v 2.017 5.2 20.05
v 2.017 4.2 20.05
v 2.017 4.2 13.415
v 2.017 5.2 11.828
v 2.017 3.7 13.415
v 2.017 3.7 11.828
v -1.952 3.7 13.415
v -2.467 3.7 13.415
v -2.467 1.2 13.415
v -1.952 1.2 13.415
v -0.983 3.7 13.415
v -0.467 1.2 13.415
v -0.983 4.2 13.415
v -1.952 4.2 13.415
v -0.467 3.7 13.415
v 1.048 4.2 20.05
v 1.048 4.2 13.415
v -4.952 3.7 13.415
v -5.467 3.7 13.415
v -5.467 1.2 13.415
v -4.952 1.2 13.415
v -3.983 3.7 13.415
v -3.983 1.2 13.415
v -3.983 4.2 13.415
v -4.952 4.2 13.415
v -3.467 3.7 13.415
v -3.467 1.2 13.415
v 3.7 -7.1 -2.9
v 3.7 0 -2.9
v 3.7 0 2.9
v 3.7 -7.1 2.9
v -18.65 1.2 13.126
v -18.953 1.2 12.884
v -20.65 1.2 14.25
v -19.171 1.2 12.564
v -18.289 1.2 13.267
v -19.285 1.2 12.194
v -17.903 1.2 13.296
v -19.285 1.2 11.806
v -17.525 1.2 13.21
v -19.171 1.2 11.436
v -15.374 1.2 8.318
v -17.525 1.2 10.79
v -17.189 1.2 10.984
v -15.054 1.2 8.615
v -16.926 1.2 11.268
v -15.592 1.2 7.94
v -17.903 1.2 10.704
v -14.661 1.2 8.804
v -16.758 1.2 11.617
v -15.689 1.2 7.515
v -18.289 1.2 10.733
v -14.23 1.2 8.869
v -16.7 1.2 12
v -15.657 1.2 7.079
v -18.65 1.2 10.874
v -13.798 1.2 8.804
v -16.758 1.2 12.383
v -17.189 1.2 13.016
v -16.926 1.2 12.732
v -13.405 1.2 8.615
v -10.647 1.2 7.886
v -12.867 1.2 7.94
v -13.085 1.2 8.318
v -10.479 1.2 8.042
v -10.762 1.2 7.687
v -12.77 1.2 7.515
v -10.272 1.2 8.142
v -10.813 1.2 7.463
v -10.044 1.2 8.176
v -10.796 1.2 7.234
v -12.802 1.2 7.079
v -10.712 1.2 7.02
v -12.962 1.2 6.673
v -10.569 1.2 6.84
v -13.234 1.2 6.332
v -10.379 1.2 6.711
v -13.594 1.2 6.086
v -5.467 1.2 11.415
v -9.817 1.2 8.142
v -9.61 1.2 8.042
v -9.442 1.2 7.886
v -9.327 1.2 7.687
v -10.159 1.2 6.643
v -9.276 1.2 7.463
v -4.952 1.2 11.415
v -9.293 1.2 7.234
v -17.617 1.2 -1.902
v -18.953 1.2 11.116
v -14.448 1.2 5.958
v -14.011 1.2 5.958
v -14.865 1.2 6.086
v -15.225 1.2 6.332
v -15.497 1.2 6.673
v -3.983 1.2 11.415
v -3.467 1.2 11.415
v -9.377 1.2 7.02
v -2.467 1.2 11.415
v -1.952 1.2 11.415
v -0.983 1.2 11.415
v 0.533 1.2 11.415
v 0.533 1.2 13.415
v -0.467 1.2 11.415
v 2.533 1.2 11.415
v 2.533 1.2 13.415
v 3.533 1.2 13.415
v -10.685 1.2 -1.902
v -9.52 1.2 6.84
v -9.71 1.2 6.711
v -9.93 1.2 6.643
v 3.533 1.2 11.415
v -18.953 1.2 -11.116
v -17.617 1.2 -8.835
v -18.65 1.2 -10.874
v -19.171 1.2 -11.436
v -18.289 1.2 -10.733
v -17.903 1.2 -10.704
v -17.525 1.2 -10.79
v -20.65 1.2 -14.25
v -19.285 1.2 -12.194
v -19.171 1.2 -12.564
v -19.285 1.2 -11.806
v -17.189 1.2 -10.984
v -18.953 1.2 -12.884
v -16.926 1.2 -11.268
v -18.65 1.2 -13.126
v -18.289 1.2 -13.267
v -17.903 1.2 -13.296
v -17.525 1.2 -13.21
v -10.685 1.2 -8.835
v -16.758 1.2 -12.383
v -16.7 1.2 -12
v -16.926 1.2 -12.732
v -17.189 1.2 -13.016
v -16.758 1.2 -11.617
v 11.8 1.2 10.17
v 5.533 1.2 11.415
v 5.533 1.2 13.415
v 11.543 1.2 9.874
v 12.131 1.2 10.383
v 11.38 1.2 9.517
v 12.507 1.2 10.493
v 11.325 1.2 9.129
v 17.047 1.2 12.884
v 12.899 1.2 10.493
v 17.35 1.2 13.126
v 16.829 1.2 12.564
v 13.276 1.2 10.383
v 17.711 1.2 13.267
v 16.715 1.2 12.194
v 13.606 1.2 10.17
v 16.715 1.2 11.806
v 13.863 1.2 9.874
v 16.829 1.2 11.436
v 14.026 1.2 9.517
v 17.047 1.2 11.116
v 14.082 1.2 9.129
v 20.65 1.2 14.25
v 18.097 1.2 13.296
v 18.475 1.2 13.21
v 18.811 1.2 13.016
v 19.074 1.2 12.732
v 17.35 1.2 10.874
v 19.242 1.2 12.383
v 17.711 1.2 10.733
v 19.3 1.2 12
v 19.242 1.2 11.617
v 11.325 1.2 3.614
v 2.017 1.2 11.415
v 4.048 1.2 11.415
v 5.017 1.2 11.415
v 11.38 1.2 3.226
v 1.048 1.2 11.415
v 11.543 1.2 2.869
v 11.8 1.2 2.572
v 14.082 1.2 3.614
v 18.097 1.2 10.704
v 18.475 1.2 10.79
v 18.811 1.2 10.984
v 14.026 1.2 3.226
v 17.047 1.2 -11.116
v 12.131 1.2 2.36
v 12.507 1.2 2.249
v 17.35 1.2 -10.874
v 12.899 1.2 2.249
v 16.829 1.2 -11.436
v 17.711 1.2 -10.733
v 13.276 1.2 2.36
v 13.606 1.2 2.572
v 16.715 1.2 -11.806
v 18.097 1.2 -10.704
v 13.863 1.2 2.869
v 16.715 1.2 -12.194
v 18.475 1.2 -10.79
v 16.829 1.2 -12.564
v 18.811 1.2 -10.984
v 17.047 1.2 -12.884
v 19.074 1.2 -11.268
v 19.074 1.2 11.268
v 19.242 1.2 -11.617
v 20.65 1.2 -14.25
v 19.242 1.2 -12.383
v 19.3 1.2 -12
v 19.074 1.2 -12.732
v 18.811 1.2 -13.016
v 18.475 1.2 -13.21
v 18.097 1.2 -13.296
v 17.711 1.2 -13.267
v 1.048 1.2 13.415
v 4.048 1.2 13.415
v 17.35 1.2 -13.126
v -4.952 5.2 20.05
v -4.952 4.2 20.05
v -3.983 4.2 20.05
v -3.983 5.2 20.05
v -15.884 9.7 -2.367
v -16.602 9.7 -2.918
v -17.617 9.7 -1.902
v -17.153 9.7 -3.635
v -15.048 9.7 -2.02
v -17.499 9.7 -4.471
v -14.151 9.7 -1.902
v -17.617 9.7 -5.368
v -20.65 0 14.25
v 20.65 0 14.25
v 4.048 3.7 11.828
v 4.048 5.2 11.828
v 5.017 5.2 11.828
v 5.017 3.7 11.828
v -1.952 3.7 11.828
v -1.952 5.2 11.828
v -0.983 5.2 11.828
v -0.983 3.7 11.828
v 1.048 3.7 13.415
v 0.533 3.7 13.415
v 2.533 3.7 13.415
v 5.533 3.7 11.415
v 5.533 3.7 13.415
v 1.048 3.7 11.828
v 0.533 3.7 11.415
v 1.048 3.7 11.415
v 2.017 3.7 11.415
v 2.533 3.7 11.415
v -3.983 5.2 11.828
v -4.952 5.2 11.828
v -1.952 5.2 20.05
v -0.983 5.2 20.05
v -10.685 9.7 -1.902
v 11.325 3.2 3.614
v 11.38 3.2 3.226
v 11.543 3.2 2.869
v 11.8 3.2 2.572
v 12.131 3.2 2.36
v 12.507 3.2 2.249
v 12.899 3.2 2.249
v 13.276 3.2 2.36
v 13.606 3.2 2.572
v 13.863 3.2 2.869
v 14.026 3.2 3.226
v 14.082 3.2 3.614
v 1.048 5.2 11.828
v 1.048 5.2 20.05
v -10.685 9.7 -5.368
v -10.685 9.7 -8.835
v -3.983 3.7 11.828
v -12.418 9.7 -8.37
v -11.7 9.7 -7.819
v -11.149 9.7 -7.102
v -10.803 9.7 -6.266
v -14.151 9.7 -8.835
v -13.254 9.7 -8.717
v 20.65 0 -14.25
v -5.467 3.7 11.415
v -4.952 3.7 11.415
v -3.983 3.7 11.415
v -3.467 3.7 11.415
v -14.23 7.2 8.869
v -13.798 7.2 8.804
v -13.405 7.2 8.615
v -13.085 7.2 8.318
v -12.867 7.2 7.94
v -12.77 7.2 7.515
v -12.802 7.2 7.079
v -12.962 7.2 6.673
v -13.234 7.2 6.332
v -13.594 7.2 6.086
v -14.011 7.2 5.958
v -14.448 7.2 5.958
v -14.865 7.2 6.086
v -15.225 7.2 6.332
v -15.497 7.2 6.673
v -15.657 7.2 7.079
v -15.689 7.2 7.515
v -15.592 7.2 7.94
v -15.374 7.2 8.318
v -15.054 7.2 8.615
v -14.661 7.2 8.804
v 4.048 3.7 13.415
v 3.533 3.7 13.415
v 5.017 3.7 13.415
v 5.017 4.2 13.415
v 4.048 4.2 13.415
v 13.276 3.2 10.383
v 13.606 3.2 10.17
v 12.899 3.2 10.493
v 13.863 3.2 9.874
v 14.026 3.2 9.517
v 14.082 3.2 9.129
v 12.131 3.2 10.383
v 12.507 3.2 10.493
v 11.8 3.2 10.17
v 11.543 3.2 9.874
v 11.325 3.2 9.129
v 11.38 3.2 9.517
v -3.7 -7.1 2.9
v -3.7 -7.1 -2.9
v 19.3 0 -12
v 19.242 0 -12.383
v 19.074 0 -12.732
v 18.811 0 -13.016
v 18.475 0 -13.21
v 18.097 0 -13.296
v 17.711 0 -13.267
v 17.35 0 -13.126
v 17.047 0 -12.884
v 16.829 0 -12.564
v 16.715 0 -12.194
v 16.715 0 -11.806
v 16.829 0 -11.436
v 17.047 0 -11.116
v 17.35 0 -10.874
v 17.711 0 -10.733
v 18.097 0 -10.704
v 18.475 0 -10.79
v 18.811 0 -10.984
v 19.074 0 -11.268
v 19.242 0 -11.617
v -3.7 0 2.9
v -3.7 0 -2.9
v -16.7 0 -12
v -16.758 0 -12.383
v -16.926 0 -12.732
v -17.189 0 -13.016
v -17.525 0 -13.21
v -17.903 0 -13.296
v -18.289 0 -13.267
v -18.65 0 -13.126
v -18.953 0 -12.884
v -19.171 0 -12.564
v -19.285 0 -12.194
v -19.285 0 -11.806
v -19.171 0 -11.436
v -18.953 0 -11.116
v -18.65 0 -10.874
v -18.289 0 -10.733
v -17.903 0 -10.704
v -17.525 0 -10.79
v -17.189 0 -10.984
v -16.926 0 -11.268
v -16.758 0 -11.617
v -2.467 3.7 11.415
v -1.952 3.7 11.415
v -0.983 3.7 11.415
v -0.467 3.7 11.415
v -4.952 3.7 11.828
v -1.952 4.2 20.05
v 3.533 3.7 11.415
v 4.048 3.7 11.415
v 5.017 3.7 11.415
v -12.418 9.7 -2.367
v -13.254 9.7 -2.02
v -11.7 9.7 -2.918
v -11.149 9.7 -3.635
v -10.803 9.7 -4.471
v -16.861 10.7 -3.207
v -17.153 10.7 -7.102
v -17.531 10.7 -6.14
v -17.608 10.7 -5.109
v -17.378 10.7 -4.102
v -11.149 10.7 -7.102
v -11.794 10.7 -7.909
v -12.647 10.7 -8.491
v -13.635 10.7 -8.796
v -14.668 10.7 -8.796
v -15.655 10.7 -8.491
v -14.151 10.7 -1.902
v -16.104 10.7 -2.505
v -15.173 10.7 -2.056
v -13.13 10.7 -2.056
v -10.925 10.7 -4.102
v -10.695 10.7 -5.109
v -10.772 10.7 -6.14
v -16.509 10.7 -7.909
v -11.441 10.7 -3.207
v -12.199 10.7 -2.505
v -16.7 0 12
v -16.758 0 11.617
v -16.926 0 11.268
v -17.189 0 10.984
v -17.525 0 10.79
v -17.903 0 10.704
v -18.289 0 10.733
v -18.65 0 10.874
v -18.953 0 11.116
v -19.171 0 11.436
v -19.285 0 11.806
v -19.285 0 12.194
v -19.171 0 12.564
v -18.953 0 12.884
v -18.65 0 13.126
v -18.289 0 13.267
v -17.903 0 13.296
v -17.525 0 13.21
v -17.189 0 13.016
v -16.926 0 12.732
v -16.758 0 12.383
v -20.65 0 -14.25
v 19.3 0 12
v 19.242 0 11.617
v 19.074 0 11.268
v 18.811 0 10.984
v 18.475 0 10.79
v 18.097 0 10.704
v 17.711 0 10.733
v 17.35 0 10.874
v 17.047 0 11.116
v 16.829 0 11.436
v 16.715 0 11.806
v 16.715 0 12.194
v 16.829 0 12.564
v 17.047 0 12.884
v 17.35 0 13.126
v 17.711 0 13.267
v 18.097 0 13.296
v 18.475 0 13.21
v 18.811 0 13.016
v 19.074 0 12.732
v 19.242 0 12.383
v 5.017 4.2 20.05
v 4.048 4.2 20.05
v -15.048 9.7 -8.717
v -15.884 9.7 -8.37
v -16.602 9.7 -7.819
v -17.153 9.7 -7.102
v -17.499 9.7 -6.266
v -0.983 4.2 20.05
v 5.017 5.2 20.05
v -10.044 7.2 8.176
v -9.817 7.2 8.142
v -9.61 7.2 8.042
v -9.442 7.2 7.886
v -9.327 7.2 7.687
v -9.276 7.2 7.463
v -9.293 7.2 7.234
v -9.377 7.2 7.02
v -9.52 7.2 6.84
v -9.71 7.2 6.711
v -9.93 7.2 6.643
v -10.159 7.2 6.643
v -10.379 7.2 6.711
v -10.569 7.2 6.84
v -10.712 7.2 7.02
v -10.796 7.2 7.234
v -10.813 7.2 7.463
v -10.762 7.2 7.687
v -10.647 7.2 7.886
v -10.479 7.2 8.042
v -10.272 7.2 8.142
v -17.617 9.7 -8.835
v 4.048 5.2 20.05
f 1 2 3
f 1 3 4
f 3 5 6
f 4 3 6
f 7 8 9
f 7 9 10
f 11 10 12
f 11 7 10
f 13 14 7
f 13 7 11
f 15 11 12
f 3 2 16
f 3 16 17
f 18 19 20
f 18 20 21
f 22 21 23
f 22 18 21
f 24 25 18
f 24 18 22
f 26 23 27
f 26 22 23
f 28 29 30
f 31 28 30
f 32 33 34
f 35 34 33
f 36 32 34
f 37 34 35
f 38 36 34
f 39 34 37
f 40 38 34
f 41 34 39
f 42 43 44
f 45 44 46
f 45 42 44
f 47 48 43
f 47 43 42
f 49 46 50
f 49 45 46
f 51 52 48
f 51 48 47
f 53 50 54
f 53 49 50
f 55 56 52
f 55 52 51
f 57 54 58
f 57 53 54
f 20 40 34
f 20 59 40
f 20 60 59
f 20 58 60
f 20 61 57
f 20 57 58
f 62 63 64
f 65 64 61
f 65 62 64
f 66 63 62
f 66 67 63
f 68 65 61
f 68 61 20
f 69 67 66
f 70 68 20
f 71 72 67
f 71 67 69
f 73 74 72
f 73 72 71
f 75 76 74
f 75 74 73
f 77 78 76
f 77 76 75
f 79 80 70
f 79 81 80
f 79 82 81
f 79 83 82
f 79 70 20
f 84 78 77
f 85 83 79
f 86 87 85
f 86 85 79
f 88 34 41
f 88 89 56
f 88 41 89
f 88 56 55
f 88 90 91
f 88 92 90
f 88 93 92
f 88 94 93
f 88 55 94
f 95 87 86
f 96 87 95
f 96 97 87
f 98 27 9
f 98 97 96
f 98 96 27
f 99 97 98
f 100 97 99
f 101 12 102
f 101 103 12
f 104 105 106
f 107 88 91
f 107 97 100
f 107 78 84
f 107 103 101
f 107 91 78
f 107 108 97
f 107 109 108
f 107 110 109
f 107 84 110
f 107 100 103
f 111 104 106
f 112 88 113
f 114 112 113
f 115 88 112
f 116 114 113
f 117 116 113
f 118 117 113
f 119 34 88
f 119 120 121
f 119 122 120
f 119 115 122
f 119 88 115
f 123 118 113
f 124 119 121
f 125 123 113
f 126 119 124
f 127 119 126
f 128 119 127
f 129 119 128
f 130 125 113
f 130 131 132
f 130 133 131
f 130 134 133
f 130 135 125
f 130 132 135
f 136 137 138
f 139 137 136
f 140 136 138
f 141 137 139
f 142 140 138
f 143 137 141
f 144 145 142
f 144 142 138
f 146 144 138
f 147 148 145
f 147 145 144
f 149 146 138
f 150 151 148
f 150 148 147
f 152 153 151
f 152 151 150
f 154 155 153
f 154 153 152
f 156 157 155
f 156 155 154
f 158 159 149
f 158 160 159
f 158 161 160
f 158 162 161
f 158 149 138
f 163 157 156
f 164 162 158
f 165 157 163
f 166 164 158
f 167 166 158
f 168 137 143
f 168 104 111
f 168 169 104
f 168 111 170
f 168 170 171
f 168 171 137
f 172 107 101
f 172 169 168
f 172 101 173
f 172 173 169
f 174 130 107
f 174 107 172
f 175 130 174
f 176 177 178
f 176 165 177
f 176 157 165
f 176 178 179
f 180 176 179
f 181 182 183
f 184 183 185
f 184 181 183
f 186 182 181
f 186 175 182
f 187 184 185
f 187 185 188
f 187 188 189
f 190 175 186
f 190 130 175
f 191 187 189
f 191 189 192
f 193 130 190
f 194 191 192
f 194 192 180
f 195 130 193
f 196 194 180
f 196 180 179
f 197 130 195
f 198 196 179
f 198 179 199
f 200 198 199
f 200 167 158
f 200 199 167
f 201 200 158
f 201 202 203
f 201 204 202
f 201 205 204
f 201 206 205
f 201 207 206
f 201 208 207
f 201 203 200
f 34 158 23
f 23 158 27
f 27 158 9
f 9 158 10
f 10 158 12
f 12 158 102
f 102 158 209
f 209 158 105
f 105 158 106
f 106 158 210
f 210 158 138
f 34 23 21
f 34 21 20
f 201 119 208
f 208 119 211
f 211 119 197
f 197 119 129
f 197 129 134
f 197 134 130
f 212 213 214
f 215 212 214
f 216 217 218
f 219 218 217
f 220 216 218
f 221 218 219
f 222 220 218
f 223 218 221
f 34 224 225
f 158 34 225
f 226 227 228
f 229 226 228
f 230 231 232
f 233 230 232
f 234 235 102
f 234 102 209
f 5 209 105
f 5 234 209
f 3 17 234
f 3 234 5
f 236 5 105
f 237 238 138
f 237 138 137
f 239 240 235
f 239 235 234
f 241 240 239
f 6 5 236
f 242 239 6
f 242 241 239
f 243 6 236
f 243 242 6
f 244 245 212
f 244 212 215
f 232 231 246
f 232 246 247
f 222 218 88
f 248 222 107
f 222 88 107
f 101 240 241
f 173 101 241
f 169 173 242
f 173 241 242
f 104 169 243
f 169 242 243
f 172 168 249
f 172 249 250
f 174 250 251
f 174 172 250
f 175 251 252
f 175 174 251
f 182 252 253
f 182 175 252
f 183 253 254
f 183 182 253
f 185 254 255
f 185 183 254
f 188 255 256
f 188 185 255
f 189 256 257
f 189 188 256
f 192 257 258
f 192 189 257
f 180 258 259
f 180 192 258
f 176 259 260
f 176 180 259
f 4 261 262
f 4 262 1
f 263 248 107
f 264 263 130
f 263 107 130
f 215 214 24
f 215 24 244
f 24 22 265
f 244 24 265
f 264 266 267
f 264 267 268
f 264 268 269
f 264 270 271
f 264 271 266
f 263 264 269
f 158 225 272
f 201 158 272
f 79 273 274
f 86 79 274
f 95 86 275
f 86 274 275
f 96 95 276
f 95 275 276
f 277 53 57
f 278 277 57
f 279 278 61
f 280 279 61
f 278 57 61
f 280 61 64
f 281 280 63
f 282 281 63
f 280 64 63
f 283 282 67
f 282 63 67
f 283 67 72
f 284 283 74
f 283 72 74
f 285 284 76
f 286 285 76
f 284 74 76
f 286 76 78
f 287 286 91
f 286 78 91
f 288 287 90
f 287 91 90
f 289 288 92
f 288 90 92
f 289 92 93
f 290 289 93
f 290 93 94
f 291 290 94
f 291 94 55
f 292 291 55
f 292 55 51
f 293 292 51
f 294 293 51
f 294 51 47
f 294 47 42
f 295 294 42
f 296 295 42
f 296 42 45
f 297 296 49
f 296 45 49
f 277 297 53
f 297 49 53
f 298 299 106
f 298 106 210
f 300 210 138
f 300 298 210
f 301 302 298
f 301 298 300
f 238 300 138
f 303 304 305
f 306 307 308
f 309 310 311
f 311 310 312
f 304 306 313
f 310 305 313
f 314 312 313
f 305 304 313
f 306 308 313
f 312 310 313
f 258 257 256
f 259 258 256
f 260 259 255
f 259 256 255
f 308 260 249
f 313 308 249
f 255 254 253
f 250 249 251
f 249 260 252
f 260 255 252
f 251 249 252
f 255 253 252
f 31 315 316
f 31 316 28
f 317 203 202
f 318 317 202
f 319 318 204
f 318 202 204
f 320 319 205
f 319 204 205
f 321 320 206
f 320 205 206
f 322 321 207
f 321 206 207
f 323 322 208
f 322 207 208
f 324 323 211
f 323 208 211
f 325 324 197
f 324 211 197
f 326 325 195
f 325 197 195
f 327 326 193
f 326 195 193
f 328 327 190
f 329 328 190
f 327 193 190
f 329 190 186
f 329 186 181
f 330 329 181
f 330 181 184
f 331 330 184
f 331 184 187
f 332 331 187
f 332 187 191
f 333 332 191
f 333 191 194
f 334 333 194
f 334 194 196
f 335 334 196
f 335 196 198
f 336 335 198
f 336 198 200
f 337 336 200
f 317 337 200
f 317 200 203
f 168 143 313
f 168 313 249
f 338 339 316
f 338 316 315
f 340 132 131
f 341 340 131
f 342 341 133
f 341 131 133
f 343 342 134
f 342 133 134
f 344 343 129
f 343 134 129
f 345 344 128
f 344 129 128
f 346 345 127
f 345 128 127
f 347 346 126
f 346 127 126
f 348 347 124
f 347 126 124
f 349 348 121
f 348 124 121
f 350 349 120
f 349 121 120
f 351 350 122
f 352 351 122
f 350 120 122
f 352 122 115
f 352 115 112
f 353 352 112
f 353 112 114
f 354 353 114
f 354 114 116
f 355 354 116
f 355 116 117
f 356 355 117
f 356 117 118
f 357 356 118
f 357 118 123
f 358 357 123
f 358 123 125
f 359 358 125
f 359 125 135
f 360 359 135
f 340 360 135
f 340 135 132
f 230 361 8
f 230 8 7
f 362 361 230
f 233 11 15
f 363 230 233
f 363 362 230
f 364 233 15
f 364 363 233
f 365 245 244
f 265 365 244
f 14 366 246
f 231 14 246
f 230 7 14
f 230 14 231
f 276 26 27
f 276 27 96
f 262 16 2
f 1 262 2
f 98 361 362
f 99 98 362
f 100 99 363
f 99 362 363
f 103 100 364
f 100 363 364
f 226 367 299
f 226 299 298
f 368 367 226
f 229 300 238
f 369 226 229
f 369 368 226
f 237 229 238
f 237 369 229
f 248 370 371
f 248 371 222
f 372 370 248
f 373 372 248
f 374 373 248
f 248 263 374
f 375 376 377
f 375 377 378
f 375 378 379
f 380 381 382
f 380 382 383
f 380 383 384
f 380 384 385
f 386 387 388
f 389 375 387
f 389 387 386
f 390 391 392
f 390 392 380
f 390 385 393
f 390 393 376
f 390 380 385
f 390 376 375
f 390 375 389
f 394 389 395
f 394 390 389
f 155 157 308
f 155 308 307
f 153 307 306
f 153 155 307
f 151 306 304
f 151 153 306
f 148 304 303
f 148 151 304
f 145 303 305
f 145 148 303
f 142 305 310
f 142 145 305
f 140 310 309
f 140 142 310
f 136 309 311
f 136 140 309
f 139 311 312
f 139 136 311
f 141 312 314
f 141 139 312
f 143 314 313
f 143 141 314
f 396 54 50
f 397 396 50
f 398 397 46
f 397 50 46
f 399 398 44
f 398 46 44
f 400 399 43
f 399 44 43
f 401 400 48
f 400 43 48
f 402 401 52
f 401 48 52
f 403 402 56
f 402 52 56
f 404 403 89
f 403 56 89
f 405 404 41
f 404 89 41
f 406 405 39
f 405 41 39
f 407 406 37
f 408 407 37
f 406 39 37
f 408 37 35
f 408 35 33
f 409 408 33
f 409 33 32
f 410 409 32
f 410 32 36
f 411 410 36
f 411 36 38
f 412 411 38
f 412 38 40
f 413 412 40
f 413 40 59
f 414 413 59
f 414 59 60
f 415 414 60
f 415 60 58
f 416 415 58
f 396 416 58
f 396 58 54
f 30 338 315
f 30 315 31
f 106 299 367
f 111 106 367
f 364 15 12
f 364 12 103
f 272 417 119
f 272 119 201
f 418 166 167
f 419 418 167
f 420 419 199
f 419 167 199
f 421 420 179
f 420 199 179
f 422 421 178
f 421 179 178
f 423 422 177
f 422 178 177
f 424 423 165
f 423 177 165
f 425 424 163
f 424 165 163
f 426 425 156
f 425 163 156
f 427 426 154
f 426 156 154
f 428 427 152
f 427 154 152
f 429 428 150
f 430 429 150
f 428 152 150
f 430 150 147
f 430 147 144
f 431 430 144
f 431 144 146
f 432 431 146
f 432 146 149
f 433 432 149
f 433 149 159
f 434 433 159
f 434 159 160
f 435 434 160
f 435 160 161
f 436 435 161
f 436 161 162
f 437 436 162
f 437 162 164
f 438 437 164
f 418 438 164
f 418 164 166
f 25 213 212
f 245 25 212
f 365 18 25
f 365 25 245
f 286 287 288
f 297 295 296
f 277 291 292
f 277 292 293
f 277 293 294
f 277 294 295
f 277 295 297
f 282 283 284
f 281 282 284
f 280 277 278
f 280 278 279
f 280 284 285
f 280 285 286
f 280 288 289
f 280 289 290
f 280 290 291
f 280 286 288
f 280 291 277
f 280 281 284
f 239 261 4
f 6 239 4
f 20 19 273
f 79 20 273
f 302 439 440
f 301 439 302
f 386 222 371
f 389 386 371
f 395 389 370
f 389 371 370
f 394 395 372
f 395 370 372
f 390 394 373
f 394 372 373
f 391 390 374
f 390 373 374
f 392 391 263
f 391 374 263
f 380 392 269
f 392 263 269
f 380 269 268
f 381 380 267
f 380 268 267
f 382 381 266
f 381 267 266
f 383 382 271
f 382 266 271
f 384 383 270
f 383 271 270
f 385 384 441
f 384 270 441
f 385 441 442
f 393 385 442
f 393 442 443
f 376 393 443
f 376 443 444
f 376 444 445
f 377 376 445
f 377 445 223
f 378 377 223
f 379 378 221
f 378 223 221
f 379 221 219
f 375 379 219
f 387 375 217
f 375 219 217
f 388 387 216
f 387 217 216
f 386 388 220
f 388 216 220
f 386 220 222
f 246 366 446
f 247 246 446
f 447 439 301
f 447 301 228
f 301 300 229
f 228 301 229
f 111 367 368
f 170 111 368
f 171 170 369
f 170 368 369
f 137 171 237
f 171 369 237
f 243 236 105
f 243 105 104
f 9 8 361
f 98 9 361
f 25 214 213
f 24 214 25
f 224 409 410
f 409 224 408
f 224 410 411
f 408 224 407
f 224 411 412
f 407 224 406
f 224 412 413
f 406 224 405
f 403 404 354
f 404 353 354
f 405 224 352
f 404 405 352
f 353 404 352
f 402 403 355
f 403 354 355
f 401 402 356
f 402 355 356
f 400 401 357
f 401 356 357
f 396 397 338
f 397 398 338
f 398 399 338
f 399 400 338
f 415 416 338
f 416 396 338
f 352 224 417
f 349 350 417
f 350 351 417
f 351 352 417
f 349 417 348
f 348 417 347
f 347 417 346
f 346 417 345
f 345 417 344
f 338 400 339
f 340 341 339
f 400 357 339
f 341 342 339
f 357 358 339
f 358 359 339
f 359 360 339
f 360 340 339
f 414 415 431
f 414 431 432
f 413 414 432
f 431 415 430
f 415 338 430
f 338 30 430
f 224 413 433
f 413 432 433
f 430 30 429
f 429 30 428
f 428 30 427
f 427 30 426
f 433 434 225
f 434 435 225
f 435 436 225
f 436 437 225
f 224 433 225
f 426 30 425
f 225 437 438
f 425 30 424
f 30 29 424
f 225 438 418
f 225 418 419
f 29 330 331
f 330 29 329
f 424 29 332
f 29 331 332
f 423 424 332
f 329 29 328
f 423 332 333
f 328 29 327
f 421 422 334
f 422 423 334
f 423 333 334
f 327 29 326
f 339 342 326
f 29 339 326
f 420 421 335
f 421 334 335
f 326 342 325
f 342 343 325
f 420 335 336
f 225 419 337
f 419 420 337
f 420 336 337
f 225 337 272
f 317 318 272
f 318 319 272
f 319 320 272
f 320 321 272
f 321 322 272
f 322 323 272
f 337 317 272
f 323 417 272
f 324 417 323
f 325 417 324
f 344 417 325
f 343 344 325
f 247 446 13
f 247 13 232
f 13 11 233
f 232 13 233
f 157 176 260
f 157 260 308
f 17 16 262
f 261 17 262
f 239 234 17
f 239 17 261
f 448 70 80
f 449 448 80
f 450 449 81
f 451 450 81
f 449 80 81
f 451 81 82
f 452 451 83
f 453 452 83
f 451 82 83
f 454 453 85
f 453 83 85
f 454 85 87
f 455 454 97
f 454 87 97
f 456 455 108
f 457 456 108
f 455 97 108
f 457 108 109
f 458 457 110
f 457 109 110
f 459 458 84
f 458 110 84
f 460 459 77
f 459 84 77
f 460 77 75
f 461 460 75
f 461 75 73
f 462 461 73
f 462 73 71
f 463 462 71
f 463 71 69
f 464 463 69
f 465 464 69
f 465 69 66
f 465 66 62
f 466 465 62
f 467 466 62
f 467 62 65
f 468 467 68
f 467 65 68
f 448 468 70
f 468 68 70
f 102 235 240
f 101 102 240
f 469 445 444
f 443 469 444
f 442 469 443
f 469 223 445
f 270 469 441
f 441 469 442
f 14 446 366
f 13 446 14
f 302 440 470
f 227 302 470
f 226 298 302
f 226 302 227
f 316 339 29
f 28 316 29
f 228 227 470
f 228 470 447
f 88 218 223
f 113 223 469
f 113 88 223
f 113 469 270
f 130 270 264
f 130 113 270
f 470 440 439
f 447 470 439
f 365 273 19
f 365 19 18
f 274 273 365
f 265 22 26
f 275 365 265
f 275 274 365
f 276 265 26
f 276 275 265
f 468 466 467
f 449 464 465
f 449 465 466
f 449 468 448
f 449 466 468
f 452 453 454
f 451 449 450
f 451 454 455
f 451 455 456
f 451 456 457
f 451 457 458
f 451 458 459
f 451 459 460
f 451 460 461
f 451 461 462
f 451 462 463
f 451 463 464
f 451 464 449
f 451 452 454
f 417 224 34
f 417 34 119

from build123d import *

# Parameters (mm, degrees)
SKETCH_1_W          = 41.3
SKETCH_1_H          = 28.5
EXTRUDE_1_DEPTH     = 1.2
SKETCH_2_R          = 3.466188446
EXTRUDE_2_DEPTH     = 9.5
SKETCH_3_W          = 7.4
SKETCH_3_H          = 5.8
EXTRUDE_3_DEPTH     = 7.1
HOLE_WIZARD_M2_1_D  = 2.6
SKETCH_6_W          = 0.968388925
SKETCH_6_H          = 8.634886507
EXTRUDE_4_DEPTH     = 4
SKETCH_7_W          = 6.634886507
SKETCH_7_H          = 3
CUT_EXTRUDE_1_DEPTH = 35.282372501
EXTRUDE_START       = -9.5
SKETCH_8_W          = 6.932376893
SKETCH_8_H          = 6.932376892
EXTRUDE_5_DEPTH     = 8.5
SKETCH_9_R          = 1.463933671
SKETCH_9_R_2        = 0.77068749
EXTRUDE_6_DEPTH     = 6
EXTRUDE_7_DEPTH     = 2
EXTRUDE_START_2     = -1.5
SKETCH_11_W         = 2
SKETCH_11_H         = 2
EXTRUDE_8_DEPTH     = 2.5
SKETCH_12_W         = 9.968388925
SKETCH_12_H         = 0.413345803
CUT_EXTRUDE_3_DEPTH = 1.5


with BuildPart() as part:
    # 草图1 → 凸台-拉伸1 (new body)
    with BuildSketch(Plane(origin=(0, 0, 0), x_dir=(1, 0, 0), z_dir=(0, 1, 0))):
        Rectangle(SKETCH_1_W, SKETCH_1_H)
    extrude(amount=EXTRUDE_1_DEPTH)

    # 草图2 → 凸台-拉伸2 (add)
    with BuildSketch(Plane(origin=(0, 1.2, 0), x_dir=(1, 0, 0), z_dir=(0, 1, 0))):
        with Locations(Location((-14.151249329, 5.368489825, 0), (0, 0, 270))):
            Circle(SKETCH_2_R)
    extrude(amount=EXTRUDE_2_DEPTH)

    # 草图3 → 凸台-拉伸3 (add)
    with BuildSketch(Plane.XZ):
        Rectangle(SKETCH_3_W, SKETCH_3_H)
    extrude(amount=EXTRUDE_3_DEPTH)

    # M2 间隙孔1 (through all)
    with Locations(Plane(origin=(0, 0, 0), x_dir=(-1, 0, 0), z_dir=(0, -1, 0))):
        with Locations((18, -12), (-18, -12), (-18, 12), (18, 12)):
            Hole(HOLE_WIZARD_M2_1_D / 2)

    # 草图6 → 凸台-拉伸4 (add)
    with BuildSketch(Plane(origin=(0, 1.2, 0), x_dir=(1, 0, 0), z_dir=(0, 1, 0))):
        with Locations((-4.46731767, -15.732556747)):
            Rectangle(SKETCH_6_W, SKETCH_6_H)
        with Locations((-1.46731767, -15.732556747)):
            Rectangle(SKETCH_6_W, SKETCH_6_H)
        with Locations((1.53268233, -15.732556747)):
            Rectangle(SKETCH_6_W, SKETCH_6_H)
        with Locations((4.53268233, -15.732556747)):
            Rectangle(SKETCH_6_W, SKETCH_6_H)
    extrude(amount=EXTRUDE_4_DEPTH)

    # 草图7 → 切除-拉伸1 (cut, through all)
    with BuildSketch(Plane(origin=(5.016876792, 0, 0), x_dir=(0, 0, -1), z_dir=(1, 0, 0))):
        with Locations((-16.732556747, 2.7)):
            Rectangle(SKETCH_7_W, SKETCH_7_H)
    extrude(amount=-CUT_EXTRUDE_1_DEPTH, mode=Mode.SUBTRACT)

    # 草图8 → 凸台-拉伸5 (add)
    with BuildSketch(Plane(origin=(0, 10.7, 0), x_dir=(1, 0, 0), z_dir=(0, 1, 0)).offset(EXTRUDE_START)):
        with Locations((-14.15124933, 5.368489825)):
            Rectangle(SKETCH_8_W, SKETCH_8_H)
    extrude(amount=EXTRUDE_5_DEPTH)

    # 草图9 → 凸台-拉伸6 (add)
    with BuildSketch(Plane(origin=(0, 1.2, 0), x_dir=(1, 0, 0), z_dir=(0, 1, 0))):
        with Locations(Location((-14.229613701, -7.405223715, 0), (0, 0, 270))):
            Circle(SKETCH_9_R)
        with Locations(Location((-10.0444332, -7.405223715, 0), (0, 0, 270))):
            Circle(SKETCH_9_R_2)
    extrude(amount=EXTRUDE_6_DEPTH)

    # 草图10 → 凸台-拉伸7 (add)
    with BuildSketch(Plane(origin=(0, 1.2, 0), x_dir=(1, 0, 0), z_dir=(0, 1, 0))):
        with BuildLine():
            Line((14.081901448, -3.613942556), (14.081901448, -9.128533333))
            ThreePointArc((14.081901448, -9.128533333), (12.703253753, -10.507181027), (11.324606059, -9.128533333))
            Line((11.324606059, -9.128533333), (11.324606059, -3.613942556))
            ThreePointArc((11.324606059, -3.613942556), (12.703253753, -2.235294862), (14.081901448, -3.613942556))
        make_face()
    extrude(amount=EXTRUDE_7_DEPTH)

    # 草图11 → 凸台-拉伸8 (add)
    with BuildSketch(Plane(origin=(0, 5.2, 0), x_dir=(1, 0, 0), z_dir=(0, 1, 0)).offset(EXTRUDE_START_2)):
        with Locations((-4.46731767, -12.415113493)):
            Rectangle(SKETCH_11_W, SKETCH_11_H)
        with Locations((-1.46731767, -12.415113493)):
            Rectangle(SKETCH_11_W, SKETCH_11_H)
        with Locations((4.53268233, -12.415113493)):
            Rectangle(SKETCH_11_W, SKETCH_11_H)
        with Locations((1.53268233, -12.415113493)):
            Rectangle(SKETCH_11_W, SKETCH_11_H)
    extrude(amount=-EXTRUDE_8_DEPTH)

    # 草图12 → 切除-拉伸3 (cut)
    with BuildSketch(Plane(origin=(0, 5.2, 0), x_dir=(1, 0, 0), z_dir=(0, 1, 0))):
        with Locations((0.03268233, -11.621786395)):
            Rectangle(SKETCH_12_W, SKETCH_12_H)
    extrude(amount=-CUT_EXTRUDE_3_DEPTH, mode=Mode.SUBTRACT)


solid = part.part
